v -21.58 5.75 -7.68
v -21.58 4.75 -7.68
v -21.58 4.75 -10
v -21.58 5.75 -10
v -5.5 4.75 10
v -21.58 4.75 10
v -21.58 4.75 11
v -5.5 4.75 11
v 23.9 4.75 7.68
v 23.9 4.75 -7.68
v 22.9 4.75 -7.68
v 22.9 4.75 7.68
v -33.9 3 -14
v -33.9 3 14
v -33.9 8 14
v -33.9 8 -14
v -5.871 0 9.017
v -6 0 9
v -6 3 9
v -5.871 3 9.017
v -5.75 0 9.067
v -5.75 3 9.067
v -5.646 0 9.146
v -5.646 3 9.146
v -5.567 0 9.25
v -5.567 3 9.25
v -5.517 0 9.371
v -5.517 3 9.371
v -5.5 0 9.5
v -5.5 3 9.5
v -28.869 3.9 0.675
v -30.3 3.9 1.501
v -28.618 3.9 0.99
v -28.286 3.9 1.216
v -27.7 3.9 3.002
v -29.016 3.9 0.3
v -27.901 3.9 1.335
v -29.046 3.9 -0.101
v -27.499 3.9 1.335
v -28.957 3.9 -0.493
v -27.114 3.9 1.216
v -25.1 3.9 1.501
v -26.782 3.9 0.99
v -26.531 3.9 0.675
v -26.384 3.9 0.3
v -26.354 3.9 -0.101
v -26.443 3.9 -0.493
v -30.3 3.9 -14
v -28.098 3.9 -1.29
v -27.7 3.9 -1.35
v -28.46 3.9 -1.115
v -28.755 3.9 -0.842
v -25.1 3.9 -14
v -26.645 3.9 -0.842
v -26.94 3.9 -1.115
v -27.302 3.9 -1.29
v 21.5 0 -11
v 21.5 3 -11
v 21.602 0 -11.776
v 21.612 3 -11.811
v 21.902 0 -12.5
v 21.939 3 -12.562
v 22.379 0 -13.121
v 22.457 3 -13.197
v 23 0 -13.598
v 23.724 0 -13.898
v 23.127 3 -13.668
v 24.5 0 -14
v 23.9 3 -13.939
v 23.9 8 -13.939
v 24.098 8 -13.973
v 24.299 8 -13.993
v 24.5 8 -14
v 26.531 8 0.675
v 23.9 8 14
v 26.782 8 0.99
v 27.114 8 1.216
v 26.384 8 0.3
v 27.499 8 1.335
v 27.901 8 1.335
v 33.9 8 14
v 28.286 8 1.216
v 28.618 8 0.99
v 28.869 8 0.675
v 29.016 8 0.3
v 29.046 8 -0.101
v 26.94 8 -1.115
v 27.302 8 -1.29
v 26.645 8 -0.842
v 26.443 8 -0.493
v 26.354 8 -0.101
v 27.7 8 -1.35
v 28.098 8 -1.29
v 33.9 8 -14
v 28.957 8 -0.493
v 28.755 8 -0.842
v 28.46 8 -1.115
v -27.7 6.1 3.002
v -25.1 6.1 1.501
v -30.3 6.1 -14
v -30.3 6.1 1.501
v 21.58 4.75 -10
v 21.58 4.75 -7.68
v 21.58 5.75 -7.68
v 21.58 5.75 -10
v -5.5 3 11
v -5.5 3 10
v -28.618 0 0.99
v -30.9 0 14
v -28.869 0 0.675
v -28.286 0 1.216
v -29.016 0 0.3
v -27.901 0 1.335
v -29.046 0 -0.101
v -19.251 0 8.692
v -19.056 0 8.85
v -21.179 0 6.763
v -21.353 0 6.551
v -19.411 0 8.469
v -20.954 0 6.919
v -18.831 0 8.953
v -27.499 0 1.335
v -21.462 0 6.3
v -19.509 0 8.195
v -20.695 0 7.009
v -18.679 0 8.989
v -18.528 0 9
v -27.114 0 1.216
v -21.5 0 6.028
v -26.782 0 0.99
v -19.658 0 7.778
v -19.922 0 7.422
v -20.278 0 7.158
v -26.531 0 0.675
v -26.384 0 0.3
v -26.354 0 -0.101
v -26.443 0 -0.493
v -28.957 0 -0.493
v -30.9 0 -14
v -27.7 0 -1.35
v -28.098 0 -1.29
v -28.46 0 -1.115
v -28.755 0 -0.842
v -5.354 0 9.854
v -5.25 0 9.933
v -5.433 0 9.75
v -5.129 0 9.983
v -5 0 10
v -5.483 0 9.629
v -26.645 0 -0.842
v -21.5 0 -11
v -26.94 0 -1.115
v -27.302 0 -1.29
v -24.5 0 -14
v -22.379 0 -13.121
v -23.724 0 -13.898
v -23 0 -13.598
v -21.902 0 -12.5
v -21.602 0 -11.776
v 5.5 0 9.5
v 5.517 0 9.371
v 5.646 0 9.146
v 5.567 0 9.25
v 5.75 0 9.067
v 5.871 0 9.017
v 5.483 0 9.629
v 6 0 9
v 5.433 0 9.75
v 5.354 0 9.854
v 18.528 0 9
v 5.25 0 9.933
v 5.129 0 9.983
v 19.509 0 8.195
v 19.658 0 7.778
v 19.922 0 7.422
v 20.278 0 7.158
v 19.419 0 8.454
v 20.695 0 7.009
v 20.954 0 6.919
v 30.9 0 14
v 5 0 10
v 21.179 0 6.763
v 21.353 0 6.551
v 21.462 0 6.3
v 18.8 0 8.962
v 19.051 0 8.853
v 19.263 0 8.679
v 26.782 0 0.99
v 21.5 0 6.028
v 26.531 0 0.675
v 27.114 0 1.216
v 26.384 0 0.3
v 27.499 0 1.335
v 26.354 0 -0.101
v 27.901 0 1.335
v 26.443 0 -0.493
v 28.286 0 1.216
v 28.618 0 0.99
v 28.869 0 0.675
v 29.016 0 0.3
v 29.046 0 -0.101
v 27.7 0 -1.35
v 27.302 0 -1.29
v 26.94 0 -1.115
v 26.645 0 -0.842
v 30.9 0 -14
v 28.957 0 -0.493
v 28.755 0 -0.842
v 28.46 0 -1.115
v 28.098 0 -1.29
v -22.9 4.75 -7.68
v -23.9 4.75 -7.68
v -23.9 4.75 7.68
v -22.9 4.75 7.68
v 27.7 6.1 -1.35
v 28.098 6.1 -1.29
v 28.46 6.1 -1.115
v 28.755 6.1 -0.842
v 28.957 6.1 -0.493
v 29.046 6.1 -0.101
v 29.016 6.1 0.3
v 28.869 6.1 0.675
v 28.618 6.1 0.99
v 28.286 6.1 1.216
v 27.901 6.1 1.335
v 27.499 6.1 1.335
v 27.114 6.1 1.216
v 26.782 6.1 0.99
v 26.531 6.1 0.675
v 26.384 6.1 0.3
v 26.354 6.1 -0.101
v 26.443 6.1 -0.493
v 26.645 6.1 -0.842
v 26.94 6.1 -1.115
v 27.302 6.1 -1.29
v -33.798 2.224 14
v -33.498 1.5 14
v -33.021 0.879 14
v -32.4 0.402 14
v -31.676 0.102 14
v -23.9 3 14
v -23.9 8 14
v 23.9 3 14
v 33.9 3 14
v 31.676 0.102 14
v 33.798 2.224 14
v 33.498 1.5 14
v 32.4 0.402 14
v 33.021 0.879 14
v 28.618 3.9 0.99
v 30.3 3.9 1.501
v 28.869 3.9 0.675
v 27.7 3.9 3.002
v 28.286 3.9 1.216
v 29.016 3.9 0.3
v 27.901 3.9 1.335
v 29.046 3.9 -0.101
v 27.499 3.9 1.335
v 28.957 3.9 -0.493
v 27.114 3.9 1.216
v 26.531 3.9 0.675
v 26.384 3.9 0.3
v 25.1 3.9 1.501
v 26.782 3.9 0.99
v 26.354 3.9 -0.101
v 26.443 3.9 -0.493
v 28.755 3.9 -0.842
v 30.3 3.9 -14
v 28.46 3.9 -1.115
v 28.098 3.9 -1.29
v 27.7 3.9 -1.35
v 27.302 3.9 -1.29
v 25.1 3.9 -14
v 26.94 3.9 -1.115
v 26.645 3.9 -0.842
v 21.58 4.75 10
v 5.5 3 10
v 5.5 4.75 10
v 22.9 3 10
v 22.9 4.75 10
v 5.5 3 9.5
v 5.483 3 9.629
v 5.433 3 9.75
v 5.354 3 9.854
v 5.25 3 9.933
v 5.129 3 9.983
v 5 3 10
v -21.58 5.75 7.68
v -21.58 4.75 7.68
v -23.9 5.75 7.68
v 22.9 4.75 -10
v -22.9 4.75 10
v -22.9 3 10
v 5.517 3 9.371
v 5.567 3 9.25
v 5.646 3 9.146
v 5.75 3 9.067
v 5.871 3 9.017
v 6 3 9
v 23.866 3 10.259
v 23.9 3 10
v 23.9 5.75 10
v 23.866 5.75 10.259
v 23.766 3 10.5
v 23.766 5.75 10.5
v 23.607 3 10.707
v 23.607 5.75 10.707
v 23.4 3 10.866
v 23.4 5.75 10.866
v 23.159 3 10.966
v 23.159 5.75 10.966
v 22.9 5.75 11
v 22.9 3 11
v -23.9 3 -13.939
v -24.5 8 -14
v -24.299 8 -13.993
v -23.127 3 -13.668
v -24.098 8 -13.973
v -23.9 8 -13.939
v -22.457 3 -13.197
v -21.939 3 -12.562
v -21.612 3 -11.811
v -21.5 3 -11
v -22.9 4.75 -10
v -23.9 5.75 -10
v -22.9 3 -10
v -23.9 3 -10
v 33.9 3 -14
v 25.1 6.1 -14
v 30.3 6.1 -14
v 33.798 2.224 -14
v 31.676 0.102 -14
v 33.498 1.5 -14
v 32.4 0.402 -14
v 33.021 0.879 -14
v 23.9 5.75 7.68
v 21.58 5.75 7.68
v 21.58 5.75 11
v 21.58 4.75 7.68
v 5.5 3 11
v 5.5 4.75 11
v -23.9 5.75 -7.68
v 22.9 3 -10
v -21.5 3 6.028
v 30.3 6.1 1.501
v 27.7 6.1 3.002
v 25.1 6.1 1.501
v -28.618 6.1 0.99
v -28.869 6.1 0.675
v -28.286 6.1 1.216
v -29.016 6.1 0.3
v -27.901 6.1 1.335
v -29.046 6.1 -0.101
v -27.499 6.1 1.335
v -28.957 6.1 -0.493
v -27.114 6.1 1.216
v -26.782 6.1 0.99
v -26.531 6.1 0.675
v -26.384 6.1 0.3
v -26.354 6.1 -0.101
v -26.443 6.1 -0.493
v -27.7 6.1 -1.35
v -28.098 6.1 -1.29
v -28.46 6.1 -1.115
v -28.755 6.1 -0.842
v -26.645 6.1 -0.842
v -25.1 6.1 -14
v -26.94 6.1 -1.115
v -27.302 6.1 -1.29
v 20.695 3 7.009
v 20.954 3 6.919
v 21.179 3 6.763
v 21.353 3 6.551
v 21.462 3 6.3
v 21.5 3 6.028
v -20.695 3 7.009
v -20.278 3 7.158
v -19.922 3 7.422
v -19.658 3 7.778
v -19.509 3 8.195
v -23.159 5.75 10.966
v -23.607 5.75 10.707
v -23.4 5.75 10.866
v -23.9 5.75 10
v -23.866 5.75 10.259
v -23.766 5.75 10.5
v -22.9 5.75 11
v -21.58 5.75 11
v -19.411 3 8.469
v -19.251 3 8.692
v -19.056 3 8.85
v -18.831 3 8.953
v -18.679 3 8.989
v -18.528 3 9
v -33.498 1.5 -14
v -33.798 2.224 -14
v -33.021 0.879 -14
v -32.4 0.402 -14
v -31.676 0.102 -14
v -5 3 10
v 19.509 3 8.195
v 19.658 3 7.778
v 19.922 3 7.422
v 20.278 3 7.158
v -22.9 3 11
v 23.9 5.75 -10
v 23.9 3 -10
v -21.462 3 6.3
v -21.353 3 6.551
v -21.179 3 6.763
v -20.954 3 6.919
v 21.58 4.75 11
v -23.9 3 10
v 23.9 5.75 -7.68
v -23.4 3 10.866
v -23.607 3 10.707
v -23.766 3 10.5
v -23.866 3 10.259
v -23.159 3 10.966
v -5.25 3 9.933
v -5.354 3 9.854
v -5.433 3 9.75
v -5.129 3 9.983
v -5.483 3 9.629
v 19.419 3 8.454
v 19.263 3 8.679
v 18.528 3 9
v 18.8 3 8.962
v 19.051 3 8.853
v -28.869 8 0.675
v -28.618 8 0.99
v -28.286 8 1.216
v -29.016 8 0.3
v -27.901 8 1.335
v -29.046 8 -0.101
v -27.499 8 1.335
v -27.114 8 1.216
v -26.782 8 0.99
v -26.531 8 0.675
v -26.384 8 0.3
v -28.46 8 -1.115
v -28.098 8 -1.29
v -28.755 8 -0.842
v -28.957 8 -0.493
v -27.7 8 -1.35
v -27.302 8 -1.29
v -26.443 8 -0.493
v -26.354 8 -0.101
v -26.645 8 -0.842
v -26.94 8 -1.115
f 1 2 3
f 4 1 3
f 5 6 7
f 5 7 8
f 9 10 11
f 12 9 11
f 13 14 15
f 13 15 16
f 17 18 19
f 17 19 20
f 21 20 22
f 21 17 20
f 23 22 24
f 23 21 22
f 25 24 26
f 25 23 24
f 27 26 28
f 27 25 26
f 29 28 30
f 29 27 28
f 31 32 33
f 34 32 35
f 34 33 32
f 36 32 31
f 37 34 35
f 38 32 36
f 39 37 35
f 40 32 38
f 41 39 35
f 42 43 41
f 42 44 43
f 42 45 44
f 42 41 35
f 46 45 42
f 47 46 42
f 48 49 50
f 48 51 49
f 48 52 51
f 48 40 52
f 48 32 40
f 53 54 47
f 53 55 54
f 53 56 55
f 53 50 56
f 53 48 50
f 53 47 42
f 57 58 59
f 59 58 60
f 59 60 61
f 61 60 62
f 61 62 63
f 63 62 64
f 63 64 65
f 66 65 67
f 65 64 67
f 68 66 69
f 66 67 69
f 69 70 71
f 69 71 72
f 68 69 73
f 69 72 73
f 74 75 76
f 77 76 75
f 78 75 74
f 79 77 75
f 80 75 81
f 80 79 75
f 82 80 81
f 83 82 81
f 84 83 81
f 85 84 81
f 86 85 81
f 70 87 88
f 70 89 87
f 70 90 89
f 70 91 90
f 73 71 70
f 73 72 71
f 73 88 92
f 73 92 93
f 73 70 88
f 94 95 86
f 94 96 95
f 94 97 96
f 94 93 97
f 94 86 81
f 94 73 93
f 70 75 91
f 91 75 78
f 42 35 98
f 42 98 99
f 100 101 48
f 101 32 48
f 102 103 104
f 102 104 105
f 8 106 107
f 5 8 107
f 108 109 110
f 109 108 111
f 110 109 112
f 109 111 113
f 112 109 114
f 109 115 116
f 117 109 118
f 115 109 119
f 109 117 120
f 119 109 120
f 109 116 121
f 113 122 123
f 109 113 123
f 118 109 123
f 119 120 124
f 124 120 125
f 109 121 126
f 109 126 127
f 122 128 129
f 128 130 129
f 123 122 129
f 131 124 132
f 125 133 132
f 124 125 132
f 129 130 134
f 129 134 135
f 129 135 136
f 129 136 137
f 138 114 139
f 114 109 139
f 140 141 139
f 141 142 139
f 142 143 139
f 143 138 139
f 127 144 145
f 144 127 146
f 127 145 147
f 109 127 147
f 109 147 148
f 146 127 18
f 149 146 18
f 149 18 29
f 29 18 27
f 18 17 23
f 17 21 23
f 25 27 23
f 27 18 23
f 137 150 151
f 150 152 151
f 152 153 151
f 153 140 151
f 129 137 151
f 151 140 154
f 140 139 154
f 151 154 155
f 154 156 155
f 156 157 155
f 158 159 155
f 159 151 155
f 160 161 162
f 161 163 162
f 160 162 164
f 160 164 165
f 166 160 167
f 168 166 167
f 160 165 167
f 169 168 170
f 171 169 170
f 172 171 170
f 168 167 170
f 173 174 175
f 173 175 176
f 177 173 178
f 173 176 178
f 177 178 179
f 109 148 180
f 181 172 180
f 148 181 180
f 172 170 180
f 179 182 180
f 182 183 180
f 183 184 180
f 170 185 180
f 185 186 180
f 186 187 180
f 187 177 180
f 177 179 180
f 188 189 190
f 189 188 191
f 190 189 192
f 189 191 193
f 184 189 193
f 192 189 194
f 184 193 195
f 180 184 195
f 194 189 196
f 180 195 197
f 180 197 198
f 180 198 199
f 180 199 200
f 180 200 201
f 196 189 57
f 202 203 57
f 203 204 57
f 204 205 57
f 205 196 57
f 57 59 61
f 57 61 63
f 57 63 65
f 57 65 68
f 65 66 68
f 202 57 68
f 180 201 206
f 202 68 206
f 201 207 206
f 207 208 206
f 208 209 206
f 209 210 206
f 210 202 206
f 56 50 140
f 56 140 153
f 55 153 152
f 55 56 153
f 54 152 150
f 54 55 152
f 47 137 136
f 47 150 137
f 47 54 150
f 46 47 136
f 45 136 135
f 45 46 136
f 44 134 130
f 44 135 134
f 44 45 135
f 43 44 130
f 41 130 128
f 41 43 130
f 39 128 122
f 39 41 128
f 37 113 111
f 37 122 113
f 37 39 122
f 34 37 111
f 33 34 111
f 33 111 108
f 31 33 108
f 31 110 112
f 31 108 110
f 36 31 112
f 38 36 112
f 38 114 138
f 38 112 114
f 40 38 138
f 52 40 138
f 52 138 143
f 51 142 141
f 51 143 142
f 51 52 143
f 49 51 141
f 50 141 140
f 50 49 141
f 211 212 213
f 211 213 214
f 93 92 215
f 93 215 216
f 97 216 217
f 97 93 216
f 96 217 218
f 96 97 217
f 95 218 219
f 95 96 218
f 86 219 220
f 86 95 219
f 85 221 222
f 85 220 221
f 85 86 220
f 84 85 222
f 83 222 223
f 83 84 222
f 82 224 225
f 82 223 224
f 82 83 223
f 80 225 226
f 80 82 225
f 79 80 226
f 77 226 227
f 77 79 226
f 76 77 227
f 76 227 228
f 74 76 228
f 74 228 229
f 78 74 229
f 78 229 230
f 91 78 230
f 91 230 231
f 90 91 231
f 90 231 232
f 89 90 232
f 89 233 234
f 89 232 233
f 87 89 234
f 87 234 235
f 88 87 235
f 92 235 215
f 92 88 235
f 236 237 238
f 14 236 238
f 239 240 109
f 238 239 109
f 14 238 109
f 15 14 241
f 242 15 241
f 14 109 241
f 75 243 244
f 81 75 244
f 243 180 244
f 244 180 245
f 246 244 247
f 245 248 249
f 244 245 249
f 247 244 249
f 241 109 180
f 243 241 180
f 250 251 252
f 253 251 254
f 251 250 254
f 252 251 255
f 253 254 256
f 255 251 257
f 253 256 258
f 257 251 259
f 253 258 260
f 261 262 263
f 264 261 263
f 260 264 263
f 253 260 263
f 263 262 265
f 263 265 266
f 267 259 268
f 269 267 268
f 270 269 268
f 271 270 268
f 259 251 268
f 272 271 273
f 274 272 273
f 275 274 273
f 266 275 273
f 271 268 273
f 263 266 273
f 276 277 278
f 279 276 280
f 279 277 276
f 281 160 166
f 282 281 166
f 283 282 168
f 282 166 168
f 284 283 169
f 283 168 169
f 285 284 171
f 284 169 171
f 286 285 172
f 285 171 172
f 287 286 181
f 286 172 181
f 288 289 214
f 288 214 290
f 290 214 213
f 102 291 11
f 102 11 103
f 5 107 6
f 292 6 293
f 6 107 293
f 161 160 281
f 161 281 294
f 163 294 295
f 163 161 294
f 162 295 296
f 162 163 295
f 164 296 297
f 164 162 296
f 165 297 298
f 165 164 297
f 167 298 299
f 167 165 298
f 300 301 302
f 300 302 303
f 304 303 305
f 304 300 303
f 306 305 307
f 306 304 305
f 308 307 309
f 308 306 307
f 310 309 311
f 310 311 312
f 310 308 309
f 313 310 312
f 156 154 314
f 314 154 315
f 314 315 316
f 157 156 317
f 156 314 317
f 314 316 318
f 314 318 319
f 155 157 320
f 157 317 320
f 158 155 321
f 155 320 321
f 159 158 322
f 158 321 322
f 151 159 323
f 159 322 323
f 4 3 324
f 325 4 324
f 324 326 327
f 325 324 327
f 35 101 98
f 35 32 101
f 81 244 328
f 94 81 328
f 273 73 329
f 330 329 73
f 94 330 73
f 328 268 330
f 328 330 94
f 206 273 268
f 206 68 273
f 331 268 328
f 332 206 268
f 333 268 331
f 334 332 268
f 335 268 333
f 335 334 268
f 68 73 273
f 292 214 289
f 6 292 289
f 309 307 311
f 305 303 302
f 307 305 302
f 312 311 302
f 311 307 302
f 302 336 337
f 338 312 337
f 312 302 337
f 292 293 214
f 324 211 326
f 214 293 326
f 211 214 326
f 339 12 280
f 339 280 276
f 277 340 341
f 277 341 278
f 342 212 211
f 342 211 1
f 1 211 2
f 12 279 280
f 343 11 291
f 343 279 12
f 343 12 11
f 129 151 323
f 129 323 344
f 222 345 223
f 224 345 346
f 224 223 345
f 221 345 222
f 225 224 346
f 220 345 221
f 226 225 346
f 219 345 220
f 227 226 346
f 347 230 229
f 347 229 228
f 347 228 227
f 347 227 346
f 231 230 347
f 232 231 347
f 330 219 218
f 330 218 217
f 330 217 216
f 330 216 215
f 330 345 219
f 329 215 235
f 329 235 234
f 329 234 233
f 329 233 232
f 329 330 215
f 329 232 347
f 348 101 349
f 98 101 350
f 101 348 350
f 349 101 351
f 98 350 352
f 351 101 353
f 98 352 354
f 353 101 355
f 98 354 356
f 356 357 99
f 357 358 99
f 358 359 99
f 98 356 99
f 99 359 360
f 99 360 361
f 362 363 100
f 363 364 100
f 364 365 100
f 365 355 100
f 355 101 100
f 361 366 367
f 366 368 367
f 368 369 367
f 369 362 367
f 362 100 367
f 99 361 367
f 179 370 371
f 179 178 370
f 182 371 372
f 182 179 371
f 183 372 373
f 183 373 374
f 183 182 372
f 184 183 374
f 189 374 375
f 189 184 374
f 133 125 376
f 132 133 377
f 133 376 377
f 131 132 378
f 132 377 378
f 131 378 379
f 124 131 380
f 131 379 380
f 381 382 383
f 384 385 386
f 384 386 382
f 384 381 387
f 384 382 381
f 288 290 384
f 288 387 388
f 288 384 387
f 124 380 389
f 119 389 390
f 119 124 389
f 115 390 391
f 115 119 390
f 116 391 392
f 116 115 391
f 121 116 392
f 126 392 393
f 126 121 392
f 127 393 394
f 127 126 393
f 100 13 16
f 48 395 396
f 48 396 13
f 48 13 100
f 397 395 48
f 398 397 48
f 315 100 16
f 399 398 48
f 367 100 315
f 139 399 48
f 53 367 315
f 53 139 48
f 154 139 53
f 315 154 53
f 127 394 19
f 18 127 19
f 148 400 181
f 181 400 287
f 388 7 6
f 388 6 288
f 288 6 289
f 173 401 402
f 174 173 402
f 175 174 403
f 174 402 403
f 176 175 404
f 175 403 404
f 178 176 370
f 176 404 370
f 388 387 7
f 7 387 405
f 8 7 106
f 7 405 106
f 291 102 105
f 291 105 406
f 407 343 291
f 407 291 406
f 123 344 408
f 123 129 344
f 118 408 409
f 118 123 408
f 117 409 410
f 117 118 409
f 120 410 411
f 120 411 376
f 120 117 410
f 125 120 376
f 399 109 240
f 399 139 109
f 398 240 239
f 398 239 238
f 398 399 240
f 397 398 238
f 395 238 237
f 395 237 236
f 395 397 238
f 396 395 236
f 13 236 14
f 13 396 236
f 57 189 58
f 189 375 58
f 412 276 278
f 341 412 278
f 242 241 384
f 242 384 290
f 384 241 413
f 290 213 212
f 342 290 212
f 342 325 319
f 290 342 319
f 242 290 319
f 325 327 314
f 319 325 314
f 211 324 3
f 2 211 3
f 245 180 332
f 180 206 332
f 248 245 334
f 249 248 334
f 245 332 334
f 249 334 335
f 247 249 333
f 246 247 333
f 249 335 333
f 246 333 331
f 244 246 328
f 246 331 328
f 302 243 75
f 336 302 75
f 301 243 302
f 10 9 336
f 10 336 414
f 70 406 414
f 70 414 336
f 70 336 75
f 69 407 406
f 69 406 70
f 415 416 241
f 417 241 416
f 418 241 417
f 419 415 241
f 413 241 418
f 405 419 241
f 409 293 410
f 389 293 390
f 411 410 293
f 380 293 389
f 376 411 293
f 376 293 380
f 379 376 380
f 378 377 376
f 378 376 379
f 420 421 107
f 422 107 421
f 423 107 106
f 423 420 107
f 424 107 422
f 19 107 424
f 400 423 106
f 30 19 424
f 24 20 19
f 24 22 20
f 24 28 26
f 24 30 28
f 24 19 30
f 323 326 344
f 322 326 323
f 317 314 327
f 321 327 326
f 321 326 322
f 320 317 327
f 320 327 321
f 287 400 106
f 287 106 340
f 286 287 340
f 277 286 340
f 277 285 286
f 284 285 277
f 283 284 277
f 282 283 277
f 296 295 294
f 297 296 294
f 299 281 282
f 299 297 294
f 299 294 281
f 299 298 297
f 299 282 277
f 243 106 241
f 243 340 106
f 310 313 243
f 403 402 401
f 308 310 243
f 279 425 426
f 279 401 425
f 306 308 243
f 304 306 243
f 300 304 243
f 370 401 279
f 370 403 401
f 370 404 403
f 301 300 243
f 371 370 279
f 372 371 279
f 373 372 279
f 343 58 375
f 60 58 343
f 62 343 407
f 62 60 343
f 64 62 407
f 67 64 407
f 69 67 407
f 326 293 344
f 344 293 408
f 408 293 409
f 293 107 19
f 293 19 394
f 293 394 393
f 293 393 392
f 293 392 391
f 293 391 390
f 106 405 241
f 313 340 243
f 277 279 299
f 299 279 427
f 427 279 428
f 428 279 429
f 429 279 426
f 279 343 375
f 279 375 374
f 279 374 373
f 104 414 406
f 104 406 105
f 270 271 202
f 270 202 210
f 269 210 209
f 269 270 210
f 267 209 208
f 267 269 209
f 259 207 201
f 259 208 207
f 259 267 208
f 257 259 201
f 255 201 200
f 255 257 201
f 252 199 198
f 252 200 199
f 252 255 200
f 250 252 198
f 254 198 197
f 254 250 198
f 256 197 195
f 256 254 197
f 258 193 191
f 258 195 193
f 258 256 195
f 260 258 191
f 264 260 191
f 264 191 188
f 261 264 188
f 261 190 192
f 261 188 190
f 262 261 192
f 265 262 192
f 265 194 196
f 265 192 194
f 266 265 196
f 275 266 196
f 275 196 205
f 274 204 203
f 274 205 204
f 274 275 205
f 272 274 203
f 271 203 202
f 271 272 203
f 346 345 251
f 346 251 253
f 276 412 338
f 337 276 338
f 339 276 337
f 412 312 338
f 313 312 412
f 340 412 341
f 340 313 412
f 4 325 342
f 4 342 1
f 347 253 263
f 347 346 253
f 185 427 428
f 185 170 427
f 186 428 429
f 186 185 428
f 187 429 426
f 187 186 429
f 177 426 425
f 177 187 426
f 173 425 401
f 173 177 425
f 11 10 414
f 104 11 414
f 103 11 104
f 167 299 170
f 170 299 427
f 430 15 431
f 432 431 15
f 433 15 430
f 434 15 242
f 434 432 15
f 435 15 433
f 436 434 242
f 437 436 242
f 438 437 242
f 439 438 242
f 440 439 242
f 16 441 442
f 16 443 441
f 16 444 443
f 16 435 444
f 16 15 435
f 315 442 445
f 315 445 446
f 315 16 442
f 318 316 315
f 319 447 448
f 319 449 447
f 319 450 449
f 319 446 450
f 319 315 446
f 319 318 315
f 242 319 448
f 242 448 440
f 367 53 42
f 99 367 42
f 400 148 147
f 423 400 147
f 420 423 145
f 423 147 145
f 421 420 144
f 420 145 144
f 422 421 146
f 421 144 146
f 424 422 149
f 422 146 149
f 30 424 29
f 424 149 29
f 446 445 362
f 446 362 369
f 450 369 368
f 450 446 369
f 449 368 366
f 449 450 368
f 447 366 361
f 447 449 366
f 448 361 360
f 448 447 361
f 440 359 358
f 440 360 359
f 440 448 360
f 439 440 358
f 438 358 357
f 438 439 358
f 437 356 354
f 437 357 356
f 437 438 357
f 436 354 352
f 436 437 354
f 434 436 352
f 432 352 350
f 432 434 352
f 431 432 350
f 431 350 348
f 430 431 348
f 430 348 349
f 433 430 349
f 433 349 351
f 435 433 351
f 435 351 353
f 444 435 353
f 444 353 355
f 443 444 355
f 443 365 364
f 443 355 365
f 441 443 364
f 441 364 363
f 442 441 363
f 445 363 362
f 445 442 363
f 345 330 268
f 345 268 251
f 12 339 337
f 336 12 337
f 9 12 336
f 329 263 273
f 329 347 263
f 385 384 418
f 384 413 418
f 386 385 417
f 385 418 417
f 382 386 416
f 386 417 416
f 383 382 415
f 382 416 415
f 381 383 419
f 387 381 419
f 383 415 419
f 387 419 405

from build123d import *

# Parameters (mm, degrees)
SKETCH1_R                = 8.05
SKETCH1_R_2              = 0.8
BOSS_EXTRUDE1_DEPTH      = 3
SKETCH1_5_R              = 0.8
BOSS_EXTRUDE3_DEPTH      = 3
CUT_EXTRUDE2_REACH       = 32.121
SKETCH5_R                = 8.05
FILLET2_R                = 1
BOSS_EXTRUDE4_DEPTH      = 1.75
BOSS_EXTRUDE7_START      = 1.75
SKETCH6_5_W              = 2.32
SKETCH6_5_H              = 2.32
BOSS_EXTRUDE7_DEPTH      = 1
SKETCH7_W                = 10
SKETCH7_H                = 28
BOSS_EXTRUDE8_DEPTH      = 8
SKETCH8_R                = 1.35
CUT_EXTRUDE3_DEPTH       = 1.1
CUT_EXTRUDE4_DEPTH       = 38.01634774
CUT_EXTRUDE4_DEPTH_BACK  = 38.01634774
SKETCH8_3_R              = 1.35
BOSS_EXTRUDE9_DEPTH      = 20
BOSS_EXTRUDE9_DEPTH_BACK = 20
SKETCH10_W               = 5
SKETCH10_H               = 3
CUT_EXTRUDE5_REACH       = 39.539
SKETCH9_W                = 43
SKETCH9_H                = 7.971706725
CUT_EXTRUDE6_REACH       = 39.016
SKETCH12_W               = 11
SKETCH12_H               = 1
FILLET3_R                = 3
FILLET4_START            = -1
FILLET4_DEPTH            = 5
FILLET4_2_DEPTH          = 3


with BuildPart() as part:
    # Sketch1 → Boss-Extrude1 (new body)
    with BuildSketch(Plane(origin=(0, 0, 0), x_dir=(1, 0, 0), z_dir=(0, 1, 0))):
        with BuildLine():
            Line((5.5, -7), (5.5, -14))
            Line((5.5, -14), (25.5, -14))
            ThreePointArc((25.5, -14), (26.207106781, -13.707106781), (26.5, -13))
            Line((26.5, -13), (26.5, 13))
            ThreePointArc((26.5, 13), (26.207106781, 13.707106781), (25.5, 14))
            Line((25.5, 14), (-25.5, 14))
            ThreePointArc((-25.5, 14), (-26.207106781, 13.707106781), (-26.5, 13))
            Line((-26.5, 13), (-26.5, -13))
            ThreePointArc((-26.5, -13), (-26.207106781, -13.707106781), (-25.5, -14))
            Line((-25.5, -14), (-5.5, -14))
            Line((-5.5, -14), (-5.5, -7))
            Line((-5.5, -7), (5.5, -7))
        make_face()
        with Locations(Location((-12.95, 0, 0), (0, 0, 270))):
            Circle(SKETCH1_R, mode=Mode.SUBTRACT)
        with Locations(Location((12.95, 0, 0), (0, 0, 270))):
            Circle(SKETCH1_R, mode=Mode.SUBTRACT)
        with BuildLine():
            ThreePointArc((-3.25, 5.75), (-5.25, 7.75), (-3.25, 9.75))
            Line((-3.25, 9.75), (3.25, 9.75))
            ThreePointArc((3.25, 9.75), (5.25, 7.75), (3.25, 5.75))
            Line((3.25, 5.75), (-3.25, 5.75))
        make_face(mode=Mode.SUBTRACT)
        with Locations(Location((-20.99, 8.49, 0), (0, 0, 270))):
            Circle(SKETCH1_R_2, mode=Mode.SUBTRACT)
        with Locations(Location((20.99, 8.49, 0), (0, 0, 270))):
            Circle(SKETCH1_R_2, mode=Mode.SUBTRACT)
        with Locations(Location((20.99, -8.49, 0), (0, 0, 270))):
            Circle(SKETCH1_R_2, mode=Mode.SUBTRACT)
        with Locations(Location((-20.99, -8.49, 0), (0, 0, 270))):
            Circle(SKETCH1_R_2, mode=Mode.SUBTRACT)
    extrude(amount=BOSS_EXTRUDE1_DEPTH)

    # Sketch1<5> → Boss-Extrude3 (add)
    with BuildSketch(Plane(origin=(0, 0, 0), x_dir=(1, 0, 0), z_dir=(0, 1, 0))):
        with Locations((20.99, 8.49)):
            Circle(SKETCH1_5_R)
        with Locations((-20.99, 8.49)):
            Circle(SKETCH1_5_R)
        with Locations((-20.99, -8.49)):
            Circle(SKETCH1_5_R)
        with Locations((20.99, -8.49)):
            Circle(SKETCH1_5_R)
    extrude(amount=BOSS_EXTRUDE3_DEPTH)

    # Sketch5 → Cut-Extrude2 (cut, up to next)
    with BuildSketch(Plane(origin=(0, 3, 0), x_dir=(1, 0, 0), z_dir=(0, 1, 0)), mode=Mode.PRIVATE) as cut_extrude2_sk1:
        with BuildLine():
            Line((3.25, 5.75), (-3.25, 5.75))
            ThreePointArc((-3.25, 5.75), (-5.052775638, 6.883974596), (-4.8112495, 9))
            Line((-4.8112495, 9), (-19.56873296, 9))
            ThreePointArc((-19.56873296, 9), (-19.502348624, 8.748830803), (-19.48, 8.49))
            ThreePointArc((-19.48, 8.49), (-20.12109264, 7.255050608), (-21.5, 7.06873296))
            Line((-21.5, 7.06873296), (-21.5, -7.06873296))
            ThreePointArc((-21.5, -7.06873296), (-20.12109264, -7.255050608), (-19.48, -8.49))
            ThreePointArc((-19.48, -8.49), (-19.502348624, -8.748830803), (-19.56873296, -9))
            Line((-19.56873296, -9), (-5.5, -9))
            Line((-5.5, -9), (-5.5, -7))
            Line((-5.5, -7), (5.5, -7))
            Line((5.5, -7), (5.5, -9))
            Line((5.5, -9), (19.56873296, -9))
            ThreePointArc((19.56873296, -9), (19.92226876, -7.42226876), (21.5, -7.06873296))
            Line((21.5, -7.06873296), (21.5, 7.06873296))
            ThreePointArc((21.5, 7.06873296), (19.92226876, 7.42226876), (19.56873296, 9))
            Line((19.56873296, 9), (4.8112495, 9))
            ThreePointArc((4.8112495, 9), (5.052775638, 6.883974596), (3.25, 5.75))
        make_face()
        with Locations((-12.95, 0)):
            Circle(SKETCH5_R, mode=Mode.SUBTRACT)
        with Locations((12.95, 0)):
            Circle(SKETCH5_R, mode=Mode.SUBTRACT)
    cut_extrude2_tool1 = extrude(cut_extrude2_sk1.sketch, amount=-CUT_EXTRUDE2_REACH, mode=Mode.PRIVATE) & part.part
    add(cut_extrude2_tool1.solids().sort_by_distance((0, 3, 0.207713))[0], mode=Mode.SUBTRACT)

    # Fillet2
    fillet2_edges = [part.edges().sort_by_distance(p)[0] for p in [
        (21.5, 1.5, 7.06873296),
        (19.56873296, 1.5, 9),
        (5.5, 1.5, 9),
        (-5.5, 1.5, 9),
        (-19.56873296, 1.5, 9),
        (-21.5, 1.5, 7.06873296),
        (-21.5, 1.5, -7.06873296),
        (-19.56873296, 1.5, -9),
        (-4.8112495, 1.5, -9),
        (4.8112495, 1.5, -9),
        (19.56873296, 1.5, -9),
        (21.5, 1.5, -7.06873296),
    ]]
    fillet(fillet2_edges, radius=FILLET2_R)

    # Sketch6 → Boss-Extrude4 (add)
    with BuildSketch(Plane(origin=(0, 3, 0), x_dir=(1, 0, 0), z_dir=(0, 1, 0))):
        with BuildLine():
            ThreePointArc((-23.9, -10), (-23.607106781, -10.707106781), (-22.9, -11))
            Line((-22.9, -11), (-5.5, -11))
            Line((-5.5, -11), (-5.5, -10))
            Line((-5.5, -10), (-22.9, -10))
            Line((-22.9, -10), (-22.9, 10))
            Line((-22.9, 10), (-23.9, 10))
            Line((-23.9, 10), (-23.9, -10))
        make_face()
    boss_extrude4 = extrude(amount=BOSS_EXTRUDE4_DEPTH)

    # Sketch6<5> → Boss-Extrude7 (add)
    with BuildSketch(Plane(origin=(0, 3, 0), x_dir=(1, 0, 0), z_dir=(0, 1, 0)).offset(BOSS_EXTRUDE7_START)):
        with BuildLine():
            Line((-23.9, -7.68), (-23.9, -10))
            ThreePointArc((-23.9, -10), (-23.607106781, -10.707106781), (-22.9, -11))
            Line((-22.9, -11), (-21.58, -11))
            Line((-21.58, -11), (-21.58, -7.68))
            Line((-21.58, -7.68), (-23.9, -7.68))
        make_face()
        with Locations((-22.74, 8.84)):
            Rectangle(SKETCH6_5_W, SKETCH6_5_H)
    boss_extrude7 = extrude(amount=BOSS_EXTRUDE7_DEPTH)

    # Mirror1: Boss-Extrude4, Boss-Extrude7 across plane
    add(boss_extrude4.mirror(Plane(origin=(0, 0, 0), x_dir=(0, 0, 1), z_dir=(1, 0, 0))))
    add(boss_extrude7.mirror(Plane(origin=(0, 0, 0), x_dir=(0, 0, 1), z_dir=(1, 0, 0))))

    # Sketch7 → Boss-Extrude8 (add)
    with BuildSketch(Plane(origin=(0, 0, 0), x_dir=(1, 0, 0), z_dir=(0, 1, 0))):
        with Locations((-28.9, 0)):
            Rectangle(SKETCH7_W, SKETCH7_H)
        with Locations((28.9, 0)):
            Rectangle(SKETCH7_W, SKETCH7_H)
    extrude(amount=BOSS_EXTRUDE8_DEPTH)

    # Sketch8 → Cut-Extrude3 (cut, symmetric)
    with BuildSketch(Plane(origin=(0, 5, 0), x_dir=(-1, 0, 0), z_dir=(0, -1, 0))):
        Polygon((-30.3, 1.5011107), (-30.3, -1.5011107), (-27.7, -3.0022214), (-25.1, -1.5011107), (-25.1, 1.5011107), (-27.7, 3.0022214), align=None)
        Polygon((-25.1, 1.5011107), (-25.1, 14), (-30.3, 14), (-30.3, 1.5011107), (-27.7, 3.0022214), align=None)
        Polygon((25.1, 14), (30.3, 14), (30.3, 1.5011107), (27.7, 3.0022214), (25.1, 1.5011107), align=None)
        Polygon((30.3, -1.5011107), (27.7, -3.0022214), (25.1, -1.5011107), (25.1, 1.5011107), (27.7, 3.0022214), (30.3, 1.5011107), align=None)
        with Locations((27.7, 0)):
            Circle(SKETCH8_R)
        with Locations((-27.7, 0)):
            Circle(SKETCH8_R)
    extrude(amount=CUT_EXTRUDE3_DEPTH, both=True, mode=Mode.SUBTRACT)

    # Sketch8<3> → Cut-Extrude4 (cut, two sides: drawn at the far end of the back side and taken through both)
    with BuildSketch(Plane(origin=(0, 5, 0), x_dir=(-1, 0, 0), z_dir=(0, -1, 0)).offset(-CUT_EXTRUDE4_DEPTH_BACK)):
        with Locations(Location((-27.7, 0, 0), (0, 0, 90))):
            Circle(SKETCH8_3_R)
        with Locations(Location((27.7, 0, 0), (0, 0, 90))):
            Circle(SKETCH8_3_R)
    extrude(amount=CUT_EXTRUDE4_DEPTH + CUT_EXTRUDE4_DEPTH_BACK, mode=Mode.SUBTRACT)

    # Sketch10 → Boss-Extrude9 (add, two sides: drawn at the far end of the back side and taken through both)
    with BuildSketch(Plane(origin=(-5.5, 0, 0), x_dir=(0, 0, -1), z_dir=(1, 0, 0)).offset(-BOSS_EXTRUDE9_DEPTH_BACK)):
        with Locations((-11.5, 1.5)):
            Rectangle(SKETCH10_W, SKETCH10_H)
    extrude(amount=BOSS_EXTRUDE9_DEPTH + BOSS_EXTRUDE9_DEPTH_BACK)

    # Sketch9 → Cut-Extrude5 (cut, up to next)
    with BuildSketch(Plane.XZ, mode=Mode.PRIVATE) as cut_extrude5_sk1:
        with Locations((0, -10.014146637)):
            Rectangle(SKETCH9_W, SKETCH9_H)
    cut_extrude5_tool1 = extrude(cut_extrude5_sk1.sketch, amount=-CUT_EXTRUDE5_REACH, mode=Mode.PRIVATE) & part.part
    add(cut_extrude5_tool1.solids().sort_by_distance((0, 0, -10.014147))[0], mode=Mode.SUBTRACT)

    # Sketch12 → Cut-Extrude6 (cut, up to next)
    with BuildSketch(Plane(origin=(0, 3, 0), x_dir=(1, 0, 0), z_dir=(0, 1, 0)), mode=Mode.PRIVATE) as cut_extrude6_sk1:
        with Locations((0, -9.5)):
            Rectangle(SKETCH12_W, SKETCH12_H)
    cut_extrude6_tool1 = extrude(cut_extrude6_sk1.sketch, amount=-CUT_EXTRUDE6_REACH, mode=Mode.PRIVATE) & part.part
    add(cut_extrude6_tool1.solids().sort_by_distance((0, 3, 9.5))[0], mode=Mode.SUBTRACT)

    # Fillet3
    fillet3_edges = [part.edges().sort_by_distance(p)[0] for p in [
        (33.9, 0, 0),
        (-33.9, 0, 0),
        (21.5, 1.5, -14),
        (-21.5, 1.5, -14),
    ]]
    fillet(fillet3_edges, radius=FILLET3_R)

    # Fillet4: read off the stored shape, not the designer's step
    # Fillet4 outline → Fillet4 (cut)
    with BuildSketch(Plane(origin=(0, 0, 0), x_dir=(1, 0, 0), z_dir=(0, 1, 0)).offset(FILLET4_START)):
        with BuildLine():
            Line((5.5, -9), (5.5, -9.5))
            ThreePointArc((5.5, -9.5), (5.646446609, -9.146446609), (6, -9))
            Line((6, -9), (5.5, -9))
        make_face()
        with BuildLine():
            ThreePointArc((-6, -9), (-5.646446609, -9.146446609), (-5.5, -9.5))
            Line((-5.5, -9.5), (-5.5, -9))
            Line((-5.5, -9), (-6, -9))
        make_face()
    extrude(amount=FILLET4_DEPTH, mode=Mode.SUBTRACT)

    # Fillet4 2 outline → Fillet4 2 (add)
    with BuildSketch(Plane(origin=(0, 0, 0), x_dir=(1, 0, 0), z_dir=(0, 1, 0))):
        with BuildLine():
            ThreePointArc((5.5, -9.5), (5.353553391, -9.853553391), (5, -10))
            Line((5, -10), (5.5, -10))
            Line((5.5, -10), (5.5, -9.5))
        make_face()
        with BuildLine():
            ThreePointArc((-5, -10), (-5.353553391, -9.853553391), (-5.5, -9.5))
            Line((-5.5, -9.5), (-5.5, -10))
            Line((-5.5, -10), (-5, -10))
        make_face()
    extrude(amount=FILLET4_2_DEPTH)


solid = part.part
